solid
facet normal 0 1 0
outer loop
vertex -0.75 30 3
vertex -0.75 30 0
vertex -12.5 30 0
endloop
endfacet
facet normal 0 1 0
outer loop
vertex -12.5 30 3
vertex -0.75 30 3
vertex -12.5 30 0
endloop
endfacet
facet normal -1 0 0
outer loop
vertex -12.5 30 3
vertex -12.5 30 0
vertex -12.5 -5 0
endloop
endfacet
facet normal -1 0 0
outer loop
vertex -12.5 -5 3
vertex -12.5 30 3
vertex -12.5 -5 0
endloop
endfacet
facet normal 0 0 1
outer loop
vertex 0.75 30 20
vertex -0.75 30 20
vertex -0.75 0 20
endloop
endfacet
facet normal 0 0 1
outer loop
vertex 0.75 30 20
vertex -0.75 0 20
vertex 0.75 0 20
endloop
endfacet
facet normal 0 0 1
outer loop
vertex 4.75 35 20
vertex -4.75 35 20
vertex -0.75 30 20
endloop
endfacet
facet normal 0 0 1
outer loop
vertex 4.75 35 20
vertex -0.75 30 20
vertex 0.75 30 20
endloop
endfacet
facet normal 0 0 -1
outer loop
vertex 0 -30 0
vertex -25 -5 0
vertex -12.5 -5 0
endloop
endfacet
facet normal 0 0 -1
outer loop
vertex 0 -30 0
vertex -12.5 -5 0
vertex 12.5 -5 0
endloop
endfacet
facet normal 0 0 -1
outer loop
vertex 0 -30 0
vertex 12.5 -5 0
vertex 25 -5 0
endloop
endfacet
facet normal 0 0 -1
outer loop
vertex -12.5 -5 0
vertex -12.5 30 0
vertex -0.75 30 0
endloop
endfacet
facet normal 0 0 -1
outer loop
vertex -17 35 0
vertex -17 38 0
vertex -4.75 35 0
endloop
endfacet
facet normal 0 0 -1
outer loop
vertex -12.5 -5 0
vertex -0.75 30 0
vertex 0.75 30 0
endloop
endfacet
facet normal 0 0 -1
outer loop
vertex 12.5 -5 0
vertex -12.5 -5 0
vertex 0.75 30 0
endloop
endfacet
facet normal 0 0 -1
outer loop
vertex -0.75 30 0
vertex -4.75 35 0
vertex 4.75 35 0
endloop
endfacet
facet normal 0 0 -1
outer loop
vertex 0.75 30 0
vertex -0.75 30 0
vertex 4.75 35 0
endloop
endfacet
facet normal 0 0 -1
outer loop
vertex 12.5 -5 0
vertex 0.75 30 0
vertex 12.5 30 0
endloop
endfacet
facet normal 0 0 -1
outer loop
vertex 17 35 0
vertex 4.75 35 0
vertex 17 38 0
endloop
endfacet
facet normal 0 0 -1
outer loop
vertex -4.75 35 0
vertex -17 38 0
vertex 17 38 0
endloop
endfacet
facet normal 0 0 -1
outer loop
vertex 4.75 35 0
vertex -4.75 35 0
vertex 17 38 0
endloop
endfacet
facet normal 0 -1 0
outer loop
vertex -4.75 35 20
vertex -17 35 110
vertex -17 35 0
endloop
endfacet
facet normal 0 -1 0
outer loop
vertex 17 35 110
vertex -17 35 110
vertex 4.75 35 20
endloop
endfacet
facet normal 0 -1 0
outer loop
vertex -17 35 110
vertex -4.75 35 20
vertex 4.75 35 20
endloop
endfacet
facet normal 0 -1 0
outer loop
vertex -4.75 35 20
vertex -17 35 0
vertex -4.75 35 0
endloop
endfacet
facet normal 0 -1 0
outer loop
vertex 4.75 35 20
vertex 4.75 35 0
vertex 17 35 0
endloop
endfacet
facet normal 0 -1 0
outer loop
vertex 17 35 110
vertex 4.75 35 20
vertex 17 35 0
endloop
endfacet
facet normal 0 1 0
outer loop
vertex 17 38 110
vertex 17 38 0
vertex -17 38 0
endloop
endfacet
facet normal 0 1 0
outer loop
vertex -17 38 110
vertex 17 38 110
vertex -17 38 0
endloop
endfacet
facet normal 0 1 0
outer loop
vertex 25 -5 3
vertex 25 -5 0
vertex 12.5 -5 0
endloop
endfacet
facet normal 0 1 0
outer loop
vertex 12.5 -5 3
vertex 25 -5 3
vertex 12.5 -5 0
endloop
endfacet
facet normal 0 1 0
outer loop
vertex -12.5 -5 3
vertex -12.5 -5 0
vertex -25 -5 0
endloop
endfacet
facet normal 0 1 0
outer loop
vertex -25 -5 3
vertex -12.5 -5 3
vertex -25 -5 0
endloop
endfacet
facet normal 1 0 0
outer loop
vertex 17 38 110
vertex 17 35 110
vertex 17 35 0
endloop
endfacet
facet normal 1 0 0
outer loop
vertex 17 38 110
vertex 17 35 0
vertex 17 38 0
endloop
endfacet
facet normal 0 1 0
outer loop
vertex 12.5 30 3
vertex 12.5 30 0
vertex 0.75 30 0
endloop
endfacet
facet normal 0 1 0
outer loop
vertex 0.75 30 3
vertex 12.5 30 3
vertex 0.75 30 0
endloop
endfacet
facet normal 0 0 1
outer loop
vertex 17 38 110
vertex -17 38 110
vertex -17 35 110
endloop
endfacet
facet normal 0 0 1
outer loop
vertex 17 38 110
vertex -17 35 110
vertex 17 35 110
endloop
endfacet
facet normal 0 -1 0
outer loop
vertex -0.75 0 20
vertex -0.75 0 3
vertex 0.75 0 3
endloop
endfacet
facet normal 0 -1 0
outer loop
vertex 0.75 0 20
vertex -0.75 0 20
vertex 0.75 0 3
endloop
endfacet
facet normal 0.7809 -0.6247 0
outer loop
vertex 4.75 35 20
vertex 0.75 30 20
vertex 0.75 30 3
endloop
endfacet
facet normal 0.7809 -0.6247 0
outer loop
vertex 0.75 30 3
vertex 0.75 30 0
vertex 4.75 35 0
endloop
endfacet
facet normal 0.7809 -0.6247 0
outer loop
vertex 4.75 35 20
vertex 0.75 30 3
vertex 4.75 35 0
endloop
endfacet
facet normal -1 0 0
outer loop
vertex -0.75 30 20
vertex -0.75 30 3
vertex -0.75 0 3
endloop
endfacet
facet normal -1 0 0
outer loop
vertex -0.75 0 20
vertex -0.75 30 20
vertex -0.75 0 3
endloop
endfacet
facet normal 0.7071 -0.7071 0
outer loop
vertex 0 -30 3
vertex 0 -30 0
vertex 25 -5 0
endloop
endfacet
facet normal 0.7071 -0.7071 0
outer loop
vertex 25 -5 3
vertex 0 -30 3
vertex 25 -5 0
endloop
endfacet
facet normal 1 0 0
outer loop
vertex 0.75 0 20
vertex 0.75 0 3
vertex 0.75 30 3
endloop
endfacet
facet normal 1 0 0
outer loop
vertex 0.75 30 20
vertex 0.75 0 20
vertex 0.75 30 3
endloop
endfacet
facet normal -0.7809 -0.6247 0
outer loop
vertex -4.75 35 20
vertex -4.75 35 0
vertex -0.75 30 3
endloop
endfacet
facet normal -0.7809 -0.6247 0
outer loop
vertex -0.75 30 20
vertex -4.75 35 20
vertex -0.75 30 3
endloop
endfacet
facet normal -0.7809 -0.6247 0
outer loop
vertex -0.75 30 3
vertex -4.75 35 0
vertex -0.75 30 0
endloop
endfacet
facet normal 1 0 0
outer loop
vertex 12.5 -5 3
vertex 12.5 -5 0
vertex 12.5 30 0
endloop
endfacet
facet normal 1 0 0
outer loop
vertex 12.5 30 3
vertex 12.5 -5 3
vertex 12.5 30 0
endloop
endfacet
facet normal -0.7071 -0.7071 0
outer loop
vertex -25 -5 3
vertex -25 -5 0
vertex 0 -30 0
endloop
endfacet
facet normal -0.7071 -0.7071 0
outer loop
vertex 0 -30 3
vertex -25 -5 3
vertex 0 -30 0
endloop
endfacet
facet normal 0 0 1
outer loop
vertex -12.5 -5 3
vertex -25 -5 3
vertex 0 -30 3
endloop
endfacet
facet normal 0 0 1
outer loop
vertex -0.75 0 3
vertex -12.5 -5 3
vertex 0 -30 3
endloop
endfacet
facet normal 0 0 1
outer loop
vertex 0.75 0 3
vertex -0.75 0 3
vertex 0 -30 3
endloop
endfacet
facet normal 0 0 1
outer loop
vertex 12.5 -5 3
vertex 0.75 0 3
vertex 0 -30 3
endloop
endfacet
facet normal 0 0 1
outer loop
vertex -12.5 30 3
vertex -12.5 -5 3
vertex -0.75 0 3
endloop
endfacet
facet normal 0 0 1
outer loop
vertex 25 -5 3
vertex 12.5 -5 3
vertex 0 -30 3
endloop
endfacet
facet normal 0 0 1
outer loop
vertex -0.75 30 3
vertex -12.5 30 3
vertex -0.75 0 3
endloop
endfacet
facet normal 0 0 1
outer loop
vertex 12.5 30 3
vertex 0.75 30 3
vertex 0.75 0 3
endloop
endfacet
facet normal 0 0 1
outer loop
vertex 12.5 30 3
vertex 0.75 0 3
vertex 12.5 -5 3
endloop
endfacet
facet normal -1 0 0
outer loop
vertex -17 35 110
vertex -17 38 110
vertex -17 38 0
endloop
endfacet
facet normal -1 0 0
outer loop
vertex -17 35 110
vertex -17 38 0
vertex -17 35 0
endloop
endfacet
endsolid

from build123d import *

# Parameters (mm, degrees)
F0_W     = 1.5
F0_H     = 30
F1_DEPTH = 3
F0_H_2   = 5
F2_DEPTH = 20
F0_H_3   = 3
F3_DEPTH = 110


with BuildPart() as f1:
    # F0 (on Top) → F1 (new body)
    with BuildSketch(Plane.XY):
        Polygon((12.5, -5), (12.5, 30), (0.75, 30), (0.75, 0), (-0.75, 0), (-0.75, 30), (-12.5, 30), (-12.5, -5), (0, -5), align=None)
        with Locations((0, 15)):
            Rectangle(F0_W, F0_H)
        Polygon((0, -30), (0, -5), (-12.5, -5), (-12.5, -17.5), align=None)
        Polygon((12.5, -17.5), (12.5, -5), (0, -5), (0, -30), align=None)
        Polygon((25, -5), (12.5, -5), (12.5, -17.5), align=None)
        Polygon((-12.5, -17.5), (-12.5, -5), (-25, -5), align=None)
    extrude(amount=F1_DEPTH)

    # F0 (on Top) → F2 (join)
    with BuildSketch(Plane.XY):
        with Locations((0, 32.5)):
            Rectangle(F0_W, F0_H_2)
        with Locations((0, 15)):
            Rectangle(F0_W, F0_H)
        Polygon((0.75, 35), (0.75, 30), (4.75, 35), align=None)
        Polygon((-4.75, 35), (-0.75, 30), (-0.75, 35), align=None)
    extrude(amount=F2_DEPTH)

    # F0 (on Top) → F3 (join)
    with BuildSketch(Plane.XY):
        Polygon((-4.75, 35), (-0.75, 35), (-0.75, 38), (-17, 38), (-17, 35), align=None)
        with Locations((0, 36.5)):
            Rectangle(F0_W, F0_H_3)
        Polygon((0.75, 38), (0.75, 35), (4.75, 35), (17, 35), (17, 38), align=None)
    extrude(amount=F3_DEPTH)


solid = f1.part
